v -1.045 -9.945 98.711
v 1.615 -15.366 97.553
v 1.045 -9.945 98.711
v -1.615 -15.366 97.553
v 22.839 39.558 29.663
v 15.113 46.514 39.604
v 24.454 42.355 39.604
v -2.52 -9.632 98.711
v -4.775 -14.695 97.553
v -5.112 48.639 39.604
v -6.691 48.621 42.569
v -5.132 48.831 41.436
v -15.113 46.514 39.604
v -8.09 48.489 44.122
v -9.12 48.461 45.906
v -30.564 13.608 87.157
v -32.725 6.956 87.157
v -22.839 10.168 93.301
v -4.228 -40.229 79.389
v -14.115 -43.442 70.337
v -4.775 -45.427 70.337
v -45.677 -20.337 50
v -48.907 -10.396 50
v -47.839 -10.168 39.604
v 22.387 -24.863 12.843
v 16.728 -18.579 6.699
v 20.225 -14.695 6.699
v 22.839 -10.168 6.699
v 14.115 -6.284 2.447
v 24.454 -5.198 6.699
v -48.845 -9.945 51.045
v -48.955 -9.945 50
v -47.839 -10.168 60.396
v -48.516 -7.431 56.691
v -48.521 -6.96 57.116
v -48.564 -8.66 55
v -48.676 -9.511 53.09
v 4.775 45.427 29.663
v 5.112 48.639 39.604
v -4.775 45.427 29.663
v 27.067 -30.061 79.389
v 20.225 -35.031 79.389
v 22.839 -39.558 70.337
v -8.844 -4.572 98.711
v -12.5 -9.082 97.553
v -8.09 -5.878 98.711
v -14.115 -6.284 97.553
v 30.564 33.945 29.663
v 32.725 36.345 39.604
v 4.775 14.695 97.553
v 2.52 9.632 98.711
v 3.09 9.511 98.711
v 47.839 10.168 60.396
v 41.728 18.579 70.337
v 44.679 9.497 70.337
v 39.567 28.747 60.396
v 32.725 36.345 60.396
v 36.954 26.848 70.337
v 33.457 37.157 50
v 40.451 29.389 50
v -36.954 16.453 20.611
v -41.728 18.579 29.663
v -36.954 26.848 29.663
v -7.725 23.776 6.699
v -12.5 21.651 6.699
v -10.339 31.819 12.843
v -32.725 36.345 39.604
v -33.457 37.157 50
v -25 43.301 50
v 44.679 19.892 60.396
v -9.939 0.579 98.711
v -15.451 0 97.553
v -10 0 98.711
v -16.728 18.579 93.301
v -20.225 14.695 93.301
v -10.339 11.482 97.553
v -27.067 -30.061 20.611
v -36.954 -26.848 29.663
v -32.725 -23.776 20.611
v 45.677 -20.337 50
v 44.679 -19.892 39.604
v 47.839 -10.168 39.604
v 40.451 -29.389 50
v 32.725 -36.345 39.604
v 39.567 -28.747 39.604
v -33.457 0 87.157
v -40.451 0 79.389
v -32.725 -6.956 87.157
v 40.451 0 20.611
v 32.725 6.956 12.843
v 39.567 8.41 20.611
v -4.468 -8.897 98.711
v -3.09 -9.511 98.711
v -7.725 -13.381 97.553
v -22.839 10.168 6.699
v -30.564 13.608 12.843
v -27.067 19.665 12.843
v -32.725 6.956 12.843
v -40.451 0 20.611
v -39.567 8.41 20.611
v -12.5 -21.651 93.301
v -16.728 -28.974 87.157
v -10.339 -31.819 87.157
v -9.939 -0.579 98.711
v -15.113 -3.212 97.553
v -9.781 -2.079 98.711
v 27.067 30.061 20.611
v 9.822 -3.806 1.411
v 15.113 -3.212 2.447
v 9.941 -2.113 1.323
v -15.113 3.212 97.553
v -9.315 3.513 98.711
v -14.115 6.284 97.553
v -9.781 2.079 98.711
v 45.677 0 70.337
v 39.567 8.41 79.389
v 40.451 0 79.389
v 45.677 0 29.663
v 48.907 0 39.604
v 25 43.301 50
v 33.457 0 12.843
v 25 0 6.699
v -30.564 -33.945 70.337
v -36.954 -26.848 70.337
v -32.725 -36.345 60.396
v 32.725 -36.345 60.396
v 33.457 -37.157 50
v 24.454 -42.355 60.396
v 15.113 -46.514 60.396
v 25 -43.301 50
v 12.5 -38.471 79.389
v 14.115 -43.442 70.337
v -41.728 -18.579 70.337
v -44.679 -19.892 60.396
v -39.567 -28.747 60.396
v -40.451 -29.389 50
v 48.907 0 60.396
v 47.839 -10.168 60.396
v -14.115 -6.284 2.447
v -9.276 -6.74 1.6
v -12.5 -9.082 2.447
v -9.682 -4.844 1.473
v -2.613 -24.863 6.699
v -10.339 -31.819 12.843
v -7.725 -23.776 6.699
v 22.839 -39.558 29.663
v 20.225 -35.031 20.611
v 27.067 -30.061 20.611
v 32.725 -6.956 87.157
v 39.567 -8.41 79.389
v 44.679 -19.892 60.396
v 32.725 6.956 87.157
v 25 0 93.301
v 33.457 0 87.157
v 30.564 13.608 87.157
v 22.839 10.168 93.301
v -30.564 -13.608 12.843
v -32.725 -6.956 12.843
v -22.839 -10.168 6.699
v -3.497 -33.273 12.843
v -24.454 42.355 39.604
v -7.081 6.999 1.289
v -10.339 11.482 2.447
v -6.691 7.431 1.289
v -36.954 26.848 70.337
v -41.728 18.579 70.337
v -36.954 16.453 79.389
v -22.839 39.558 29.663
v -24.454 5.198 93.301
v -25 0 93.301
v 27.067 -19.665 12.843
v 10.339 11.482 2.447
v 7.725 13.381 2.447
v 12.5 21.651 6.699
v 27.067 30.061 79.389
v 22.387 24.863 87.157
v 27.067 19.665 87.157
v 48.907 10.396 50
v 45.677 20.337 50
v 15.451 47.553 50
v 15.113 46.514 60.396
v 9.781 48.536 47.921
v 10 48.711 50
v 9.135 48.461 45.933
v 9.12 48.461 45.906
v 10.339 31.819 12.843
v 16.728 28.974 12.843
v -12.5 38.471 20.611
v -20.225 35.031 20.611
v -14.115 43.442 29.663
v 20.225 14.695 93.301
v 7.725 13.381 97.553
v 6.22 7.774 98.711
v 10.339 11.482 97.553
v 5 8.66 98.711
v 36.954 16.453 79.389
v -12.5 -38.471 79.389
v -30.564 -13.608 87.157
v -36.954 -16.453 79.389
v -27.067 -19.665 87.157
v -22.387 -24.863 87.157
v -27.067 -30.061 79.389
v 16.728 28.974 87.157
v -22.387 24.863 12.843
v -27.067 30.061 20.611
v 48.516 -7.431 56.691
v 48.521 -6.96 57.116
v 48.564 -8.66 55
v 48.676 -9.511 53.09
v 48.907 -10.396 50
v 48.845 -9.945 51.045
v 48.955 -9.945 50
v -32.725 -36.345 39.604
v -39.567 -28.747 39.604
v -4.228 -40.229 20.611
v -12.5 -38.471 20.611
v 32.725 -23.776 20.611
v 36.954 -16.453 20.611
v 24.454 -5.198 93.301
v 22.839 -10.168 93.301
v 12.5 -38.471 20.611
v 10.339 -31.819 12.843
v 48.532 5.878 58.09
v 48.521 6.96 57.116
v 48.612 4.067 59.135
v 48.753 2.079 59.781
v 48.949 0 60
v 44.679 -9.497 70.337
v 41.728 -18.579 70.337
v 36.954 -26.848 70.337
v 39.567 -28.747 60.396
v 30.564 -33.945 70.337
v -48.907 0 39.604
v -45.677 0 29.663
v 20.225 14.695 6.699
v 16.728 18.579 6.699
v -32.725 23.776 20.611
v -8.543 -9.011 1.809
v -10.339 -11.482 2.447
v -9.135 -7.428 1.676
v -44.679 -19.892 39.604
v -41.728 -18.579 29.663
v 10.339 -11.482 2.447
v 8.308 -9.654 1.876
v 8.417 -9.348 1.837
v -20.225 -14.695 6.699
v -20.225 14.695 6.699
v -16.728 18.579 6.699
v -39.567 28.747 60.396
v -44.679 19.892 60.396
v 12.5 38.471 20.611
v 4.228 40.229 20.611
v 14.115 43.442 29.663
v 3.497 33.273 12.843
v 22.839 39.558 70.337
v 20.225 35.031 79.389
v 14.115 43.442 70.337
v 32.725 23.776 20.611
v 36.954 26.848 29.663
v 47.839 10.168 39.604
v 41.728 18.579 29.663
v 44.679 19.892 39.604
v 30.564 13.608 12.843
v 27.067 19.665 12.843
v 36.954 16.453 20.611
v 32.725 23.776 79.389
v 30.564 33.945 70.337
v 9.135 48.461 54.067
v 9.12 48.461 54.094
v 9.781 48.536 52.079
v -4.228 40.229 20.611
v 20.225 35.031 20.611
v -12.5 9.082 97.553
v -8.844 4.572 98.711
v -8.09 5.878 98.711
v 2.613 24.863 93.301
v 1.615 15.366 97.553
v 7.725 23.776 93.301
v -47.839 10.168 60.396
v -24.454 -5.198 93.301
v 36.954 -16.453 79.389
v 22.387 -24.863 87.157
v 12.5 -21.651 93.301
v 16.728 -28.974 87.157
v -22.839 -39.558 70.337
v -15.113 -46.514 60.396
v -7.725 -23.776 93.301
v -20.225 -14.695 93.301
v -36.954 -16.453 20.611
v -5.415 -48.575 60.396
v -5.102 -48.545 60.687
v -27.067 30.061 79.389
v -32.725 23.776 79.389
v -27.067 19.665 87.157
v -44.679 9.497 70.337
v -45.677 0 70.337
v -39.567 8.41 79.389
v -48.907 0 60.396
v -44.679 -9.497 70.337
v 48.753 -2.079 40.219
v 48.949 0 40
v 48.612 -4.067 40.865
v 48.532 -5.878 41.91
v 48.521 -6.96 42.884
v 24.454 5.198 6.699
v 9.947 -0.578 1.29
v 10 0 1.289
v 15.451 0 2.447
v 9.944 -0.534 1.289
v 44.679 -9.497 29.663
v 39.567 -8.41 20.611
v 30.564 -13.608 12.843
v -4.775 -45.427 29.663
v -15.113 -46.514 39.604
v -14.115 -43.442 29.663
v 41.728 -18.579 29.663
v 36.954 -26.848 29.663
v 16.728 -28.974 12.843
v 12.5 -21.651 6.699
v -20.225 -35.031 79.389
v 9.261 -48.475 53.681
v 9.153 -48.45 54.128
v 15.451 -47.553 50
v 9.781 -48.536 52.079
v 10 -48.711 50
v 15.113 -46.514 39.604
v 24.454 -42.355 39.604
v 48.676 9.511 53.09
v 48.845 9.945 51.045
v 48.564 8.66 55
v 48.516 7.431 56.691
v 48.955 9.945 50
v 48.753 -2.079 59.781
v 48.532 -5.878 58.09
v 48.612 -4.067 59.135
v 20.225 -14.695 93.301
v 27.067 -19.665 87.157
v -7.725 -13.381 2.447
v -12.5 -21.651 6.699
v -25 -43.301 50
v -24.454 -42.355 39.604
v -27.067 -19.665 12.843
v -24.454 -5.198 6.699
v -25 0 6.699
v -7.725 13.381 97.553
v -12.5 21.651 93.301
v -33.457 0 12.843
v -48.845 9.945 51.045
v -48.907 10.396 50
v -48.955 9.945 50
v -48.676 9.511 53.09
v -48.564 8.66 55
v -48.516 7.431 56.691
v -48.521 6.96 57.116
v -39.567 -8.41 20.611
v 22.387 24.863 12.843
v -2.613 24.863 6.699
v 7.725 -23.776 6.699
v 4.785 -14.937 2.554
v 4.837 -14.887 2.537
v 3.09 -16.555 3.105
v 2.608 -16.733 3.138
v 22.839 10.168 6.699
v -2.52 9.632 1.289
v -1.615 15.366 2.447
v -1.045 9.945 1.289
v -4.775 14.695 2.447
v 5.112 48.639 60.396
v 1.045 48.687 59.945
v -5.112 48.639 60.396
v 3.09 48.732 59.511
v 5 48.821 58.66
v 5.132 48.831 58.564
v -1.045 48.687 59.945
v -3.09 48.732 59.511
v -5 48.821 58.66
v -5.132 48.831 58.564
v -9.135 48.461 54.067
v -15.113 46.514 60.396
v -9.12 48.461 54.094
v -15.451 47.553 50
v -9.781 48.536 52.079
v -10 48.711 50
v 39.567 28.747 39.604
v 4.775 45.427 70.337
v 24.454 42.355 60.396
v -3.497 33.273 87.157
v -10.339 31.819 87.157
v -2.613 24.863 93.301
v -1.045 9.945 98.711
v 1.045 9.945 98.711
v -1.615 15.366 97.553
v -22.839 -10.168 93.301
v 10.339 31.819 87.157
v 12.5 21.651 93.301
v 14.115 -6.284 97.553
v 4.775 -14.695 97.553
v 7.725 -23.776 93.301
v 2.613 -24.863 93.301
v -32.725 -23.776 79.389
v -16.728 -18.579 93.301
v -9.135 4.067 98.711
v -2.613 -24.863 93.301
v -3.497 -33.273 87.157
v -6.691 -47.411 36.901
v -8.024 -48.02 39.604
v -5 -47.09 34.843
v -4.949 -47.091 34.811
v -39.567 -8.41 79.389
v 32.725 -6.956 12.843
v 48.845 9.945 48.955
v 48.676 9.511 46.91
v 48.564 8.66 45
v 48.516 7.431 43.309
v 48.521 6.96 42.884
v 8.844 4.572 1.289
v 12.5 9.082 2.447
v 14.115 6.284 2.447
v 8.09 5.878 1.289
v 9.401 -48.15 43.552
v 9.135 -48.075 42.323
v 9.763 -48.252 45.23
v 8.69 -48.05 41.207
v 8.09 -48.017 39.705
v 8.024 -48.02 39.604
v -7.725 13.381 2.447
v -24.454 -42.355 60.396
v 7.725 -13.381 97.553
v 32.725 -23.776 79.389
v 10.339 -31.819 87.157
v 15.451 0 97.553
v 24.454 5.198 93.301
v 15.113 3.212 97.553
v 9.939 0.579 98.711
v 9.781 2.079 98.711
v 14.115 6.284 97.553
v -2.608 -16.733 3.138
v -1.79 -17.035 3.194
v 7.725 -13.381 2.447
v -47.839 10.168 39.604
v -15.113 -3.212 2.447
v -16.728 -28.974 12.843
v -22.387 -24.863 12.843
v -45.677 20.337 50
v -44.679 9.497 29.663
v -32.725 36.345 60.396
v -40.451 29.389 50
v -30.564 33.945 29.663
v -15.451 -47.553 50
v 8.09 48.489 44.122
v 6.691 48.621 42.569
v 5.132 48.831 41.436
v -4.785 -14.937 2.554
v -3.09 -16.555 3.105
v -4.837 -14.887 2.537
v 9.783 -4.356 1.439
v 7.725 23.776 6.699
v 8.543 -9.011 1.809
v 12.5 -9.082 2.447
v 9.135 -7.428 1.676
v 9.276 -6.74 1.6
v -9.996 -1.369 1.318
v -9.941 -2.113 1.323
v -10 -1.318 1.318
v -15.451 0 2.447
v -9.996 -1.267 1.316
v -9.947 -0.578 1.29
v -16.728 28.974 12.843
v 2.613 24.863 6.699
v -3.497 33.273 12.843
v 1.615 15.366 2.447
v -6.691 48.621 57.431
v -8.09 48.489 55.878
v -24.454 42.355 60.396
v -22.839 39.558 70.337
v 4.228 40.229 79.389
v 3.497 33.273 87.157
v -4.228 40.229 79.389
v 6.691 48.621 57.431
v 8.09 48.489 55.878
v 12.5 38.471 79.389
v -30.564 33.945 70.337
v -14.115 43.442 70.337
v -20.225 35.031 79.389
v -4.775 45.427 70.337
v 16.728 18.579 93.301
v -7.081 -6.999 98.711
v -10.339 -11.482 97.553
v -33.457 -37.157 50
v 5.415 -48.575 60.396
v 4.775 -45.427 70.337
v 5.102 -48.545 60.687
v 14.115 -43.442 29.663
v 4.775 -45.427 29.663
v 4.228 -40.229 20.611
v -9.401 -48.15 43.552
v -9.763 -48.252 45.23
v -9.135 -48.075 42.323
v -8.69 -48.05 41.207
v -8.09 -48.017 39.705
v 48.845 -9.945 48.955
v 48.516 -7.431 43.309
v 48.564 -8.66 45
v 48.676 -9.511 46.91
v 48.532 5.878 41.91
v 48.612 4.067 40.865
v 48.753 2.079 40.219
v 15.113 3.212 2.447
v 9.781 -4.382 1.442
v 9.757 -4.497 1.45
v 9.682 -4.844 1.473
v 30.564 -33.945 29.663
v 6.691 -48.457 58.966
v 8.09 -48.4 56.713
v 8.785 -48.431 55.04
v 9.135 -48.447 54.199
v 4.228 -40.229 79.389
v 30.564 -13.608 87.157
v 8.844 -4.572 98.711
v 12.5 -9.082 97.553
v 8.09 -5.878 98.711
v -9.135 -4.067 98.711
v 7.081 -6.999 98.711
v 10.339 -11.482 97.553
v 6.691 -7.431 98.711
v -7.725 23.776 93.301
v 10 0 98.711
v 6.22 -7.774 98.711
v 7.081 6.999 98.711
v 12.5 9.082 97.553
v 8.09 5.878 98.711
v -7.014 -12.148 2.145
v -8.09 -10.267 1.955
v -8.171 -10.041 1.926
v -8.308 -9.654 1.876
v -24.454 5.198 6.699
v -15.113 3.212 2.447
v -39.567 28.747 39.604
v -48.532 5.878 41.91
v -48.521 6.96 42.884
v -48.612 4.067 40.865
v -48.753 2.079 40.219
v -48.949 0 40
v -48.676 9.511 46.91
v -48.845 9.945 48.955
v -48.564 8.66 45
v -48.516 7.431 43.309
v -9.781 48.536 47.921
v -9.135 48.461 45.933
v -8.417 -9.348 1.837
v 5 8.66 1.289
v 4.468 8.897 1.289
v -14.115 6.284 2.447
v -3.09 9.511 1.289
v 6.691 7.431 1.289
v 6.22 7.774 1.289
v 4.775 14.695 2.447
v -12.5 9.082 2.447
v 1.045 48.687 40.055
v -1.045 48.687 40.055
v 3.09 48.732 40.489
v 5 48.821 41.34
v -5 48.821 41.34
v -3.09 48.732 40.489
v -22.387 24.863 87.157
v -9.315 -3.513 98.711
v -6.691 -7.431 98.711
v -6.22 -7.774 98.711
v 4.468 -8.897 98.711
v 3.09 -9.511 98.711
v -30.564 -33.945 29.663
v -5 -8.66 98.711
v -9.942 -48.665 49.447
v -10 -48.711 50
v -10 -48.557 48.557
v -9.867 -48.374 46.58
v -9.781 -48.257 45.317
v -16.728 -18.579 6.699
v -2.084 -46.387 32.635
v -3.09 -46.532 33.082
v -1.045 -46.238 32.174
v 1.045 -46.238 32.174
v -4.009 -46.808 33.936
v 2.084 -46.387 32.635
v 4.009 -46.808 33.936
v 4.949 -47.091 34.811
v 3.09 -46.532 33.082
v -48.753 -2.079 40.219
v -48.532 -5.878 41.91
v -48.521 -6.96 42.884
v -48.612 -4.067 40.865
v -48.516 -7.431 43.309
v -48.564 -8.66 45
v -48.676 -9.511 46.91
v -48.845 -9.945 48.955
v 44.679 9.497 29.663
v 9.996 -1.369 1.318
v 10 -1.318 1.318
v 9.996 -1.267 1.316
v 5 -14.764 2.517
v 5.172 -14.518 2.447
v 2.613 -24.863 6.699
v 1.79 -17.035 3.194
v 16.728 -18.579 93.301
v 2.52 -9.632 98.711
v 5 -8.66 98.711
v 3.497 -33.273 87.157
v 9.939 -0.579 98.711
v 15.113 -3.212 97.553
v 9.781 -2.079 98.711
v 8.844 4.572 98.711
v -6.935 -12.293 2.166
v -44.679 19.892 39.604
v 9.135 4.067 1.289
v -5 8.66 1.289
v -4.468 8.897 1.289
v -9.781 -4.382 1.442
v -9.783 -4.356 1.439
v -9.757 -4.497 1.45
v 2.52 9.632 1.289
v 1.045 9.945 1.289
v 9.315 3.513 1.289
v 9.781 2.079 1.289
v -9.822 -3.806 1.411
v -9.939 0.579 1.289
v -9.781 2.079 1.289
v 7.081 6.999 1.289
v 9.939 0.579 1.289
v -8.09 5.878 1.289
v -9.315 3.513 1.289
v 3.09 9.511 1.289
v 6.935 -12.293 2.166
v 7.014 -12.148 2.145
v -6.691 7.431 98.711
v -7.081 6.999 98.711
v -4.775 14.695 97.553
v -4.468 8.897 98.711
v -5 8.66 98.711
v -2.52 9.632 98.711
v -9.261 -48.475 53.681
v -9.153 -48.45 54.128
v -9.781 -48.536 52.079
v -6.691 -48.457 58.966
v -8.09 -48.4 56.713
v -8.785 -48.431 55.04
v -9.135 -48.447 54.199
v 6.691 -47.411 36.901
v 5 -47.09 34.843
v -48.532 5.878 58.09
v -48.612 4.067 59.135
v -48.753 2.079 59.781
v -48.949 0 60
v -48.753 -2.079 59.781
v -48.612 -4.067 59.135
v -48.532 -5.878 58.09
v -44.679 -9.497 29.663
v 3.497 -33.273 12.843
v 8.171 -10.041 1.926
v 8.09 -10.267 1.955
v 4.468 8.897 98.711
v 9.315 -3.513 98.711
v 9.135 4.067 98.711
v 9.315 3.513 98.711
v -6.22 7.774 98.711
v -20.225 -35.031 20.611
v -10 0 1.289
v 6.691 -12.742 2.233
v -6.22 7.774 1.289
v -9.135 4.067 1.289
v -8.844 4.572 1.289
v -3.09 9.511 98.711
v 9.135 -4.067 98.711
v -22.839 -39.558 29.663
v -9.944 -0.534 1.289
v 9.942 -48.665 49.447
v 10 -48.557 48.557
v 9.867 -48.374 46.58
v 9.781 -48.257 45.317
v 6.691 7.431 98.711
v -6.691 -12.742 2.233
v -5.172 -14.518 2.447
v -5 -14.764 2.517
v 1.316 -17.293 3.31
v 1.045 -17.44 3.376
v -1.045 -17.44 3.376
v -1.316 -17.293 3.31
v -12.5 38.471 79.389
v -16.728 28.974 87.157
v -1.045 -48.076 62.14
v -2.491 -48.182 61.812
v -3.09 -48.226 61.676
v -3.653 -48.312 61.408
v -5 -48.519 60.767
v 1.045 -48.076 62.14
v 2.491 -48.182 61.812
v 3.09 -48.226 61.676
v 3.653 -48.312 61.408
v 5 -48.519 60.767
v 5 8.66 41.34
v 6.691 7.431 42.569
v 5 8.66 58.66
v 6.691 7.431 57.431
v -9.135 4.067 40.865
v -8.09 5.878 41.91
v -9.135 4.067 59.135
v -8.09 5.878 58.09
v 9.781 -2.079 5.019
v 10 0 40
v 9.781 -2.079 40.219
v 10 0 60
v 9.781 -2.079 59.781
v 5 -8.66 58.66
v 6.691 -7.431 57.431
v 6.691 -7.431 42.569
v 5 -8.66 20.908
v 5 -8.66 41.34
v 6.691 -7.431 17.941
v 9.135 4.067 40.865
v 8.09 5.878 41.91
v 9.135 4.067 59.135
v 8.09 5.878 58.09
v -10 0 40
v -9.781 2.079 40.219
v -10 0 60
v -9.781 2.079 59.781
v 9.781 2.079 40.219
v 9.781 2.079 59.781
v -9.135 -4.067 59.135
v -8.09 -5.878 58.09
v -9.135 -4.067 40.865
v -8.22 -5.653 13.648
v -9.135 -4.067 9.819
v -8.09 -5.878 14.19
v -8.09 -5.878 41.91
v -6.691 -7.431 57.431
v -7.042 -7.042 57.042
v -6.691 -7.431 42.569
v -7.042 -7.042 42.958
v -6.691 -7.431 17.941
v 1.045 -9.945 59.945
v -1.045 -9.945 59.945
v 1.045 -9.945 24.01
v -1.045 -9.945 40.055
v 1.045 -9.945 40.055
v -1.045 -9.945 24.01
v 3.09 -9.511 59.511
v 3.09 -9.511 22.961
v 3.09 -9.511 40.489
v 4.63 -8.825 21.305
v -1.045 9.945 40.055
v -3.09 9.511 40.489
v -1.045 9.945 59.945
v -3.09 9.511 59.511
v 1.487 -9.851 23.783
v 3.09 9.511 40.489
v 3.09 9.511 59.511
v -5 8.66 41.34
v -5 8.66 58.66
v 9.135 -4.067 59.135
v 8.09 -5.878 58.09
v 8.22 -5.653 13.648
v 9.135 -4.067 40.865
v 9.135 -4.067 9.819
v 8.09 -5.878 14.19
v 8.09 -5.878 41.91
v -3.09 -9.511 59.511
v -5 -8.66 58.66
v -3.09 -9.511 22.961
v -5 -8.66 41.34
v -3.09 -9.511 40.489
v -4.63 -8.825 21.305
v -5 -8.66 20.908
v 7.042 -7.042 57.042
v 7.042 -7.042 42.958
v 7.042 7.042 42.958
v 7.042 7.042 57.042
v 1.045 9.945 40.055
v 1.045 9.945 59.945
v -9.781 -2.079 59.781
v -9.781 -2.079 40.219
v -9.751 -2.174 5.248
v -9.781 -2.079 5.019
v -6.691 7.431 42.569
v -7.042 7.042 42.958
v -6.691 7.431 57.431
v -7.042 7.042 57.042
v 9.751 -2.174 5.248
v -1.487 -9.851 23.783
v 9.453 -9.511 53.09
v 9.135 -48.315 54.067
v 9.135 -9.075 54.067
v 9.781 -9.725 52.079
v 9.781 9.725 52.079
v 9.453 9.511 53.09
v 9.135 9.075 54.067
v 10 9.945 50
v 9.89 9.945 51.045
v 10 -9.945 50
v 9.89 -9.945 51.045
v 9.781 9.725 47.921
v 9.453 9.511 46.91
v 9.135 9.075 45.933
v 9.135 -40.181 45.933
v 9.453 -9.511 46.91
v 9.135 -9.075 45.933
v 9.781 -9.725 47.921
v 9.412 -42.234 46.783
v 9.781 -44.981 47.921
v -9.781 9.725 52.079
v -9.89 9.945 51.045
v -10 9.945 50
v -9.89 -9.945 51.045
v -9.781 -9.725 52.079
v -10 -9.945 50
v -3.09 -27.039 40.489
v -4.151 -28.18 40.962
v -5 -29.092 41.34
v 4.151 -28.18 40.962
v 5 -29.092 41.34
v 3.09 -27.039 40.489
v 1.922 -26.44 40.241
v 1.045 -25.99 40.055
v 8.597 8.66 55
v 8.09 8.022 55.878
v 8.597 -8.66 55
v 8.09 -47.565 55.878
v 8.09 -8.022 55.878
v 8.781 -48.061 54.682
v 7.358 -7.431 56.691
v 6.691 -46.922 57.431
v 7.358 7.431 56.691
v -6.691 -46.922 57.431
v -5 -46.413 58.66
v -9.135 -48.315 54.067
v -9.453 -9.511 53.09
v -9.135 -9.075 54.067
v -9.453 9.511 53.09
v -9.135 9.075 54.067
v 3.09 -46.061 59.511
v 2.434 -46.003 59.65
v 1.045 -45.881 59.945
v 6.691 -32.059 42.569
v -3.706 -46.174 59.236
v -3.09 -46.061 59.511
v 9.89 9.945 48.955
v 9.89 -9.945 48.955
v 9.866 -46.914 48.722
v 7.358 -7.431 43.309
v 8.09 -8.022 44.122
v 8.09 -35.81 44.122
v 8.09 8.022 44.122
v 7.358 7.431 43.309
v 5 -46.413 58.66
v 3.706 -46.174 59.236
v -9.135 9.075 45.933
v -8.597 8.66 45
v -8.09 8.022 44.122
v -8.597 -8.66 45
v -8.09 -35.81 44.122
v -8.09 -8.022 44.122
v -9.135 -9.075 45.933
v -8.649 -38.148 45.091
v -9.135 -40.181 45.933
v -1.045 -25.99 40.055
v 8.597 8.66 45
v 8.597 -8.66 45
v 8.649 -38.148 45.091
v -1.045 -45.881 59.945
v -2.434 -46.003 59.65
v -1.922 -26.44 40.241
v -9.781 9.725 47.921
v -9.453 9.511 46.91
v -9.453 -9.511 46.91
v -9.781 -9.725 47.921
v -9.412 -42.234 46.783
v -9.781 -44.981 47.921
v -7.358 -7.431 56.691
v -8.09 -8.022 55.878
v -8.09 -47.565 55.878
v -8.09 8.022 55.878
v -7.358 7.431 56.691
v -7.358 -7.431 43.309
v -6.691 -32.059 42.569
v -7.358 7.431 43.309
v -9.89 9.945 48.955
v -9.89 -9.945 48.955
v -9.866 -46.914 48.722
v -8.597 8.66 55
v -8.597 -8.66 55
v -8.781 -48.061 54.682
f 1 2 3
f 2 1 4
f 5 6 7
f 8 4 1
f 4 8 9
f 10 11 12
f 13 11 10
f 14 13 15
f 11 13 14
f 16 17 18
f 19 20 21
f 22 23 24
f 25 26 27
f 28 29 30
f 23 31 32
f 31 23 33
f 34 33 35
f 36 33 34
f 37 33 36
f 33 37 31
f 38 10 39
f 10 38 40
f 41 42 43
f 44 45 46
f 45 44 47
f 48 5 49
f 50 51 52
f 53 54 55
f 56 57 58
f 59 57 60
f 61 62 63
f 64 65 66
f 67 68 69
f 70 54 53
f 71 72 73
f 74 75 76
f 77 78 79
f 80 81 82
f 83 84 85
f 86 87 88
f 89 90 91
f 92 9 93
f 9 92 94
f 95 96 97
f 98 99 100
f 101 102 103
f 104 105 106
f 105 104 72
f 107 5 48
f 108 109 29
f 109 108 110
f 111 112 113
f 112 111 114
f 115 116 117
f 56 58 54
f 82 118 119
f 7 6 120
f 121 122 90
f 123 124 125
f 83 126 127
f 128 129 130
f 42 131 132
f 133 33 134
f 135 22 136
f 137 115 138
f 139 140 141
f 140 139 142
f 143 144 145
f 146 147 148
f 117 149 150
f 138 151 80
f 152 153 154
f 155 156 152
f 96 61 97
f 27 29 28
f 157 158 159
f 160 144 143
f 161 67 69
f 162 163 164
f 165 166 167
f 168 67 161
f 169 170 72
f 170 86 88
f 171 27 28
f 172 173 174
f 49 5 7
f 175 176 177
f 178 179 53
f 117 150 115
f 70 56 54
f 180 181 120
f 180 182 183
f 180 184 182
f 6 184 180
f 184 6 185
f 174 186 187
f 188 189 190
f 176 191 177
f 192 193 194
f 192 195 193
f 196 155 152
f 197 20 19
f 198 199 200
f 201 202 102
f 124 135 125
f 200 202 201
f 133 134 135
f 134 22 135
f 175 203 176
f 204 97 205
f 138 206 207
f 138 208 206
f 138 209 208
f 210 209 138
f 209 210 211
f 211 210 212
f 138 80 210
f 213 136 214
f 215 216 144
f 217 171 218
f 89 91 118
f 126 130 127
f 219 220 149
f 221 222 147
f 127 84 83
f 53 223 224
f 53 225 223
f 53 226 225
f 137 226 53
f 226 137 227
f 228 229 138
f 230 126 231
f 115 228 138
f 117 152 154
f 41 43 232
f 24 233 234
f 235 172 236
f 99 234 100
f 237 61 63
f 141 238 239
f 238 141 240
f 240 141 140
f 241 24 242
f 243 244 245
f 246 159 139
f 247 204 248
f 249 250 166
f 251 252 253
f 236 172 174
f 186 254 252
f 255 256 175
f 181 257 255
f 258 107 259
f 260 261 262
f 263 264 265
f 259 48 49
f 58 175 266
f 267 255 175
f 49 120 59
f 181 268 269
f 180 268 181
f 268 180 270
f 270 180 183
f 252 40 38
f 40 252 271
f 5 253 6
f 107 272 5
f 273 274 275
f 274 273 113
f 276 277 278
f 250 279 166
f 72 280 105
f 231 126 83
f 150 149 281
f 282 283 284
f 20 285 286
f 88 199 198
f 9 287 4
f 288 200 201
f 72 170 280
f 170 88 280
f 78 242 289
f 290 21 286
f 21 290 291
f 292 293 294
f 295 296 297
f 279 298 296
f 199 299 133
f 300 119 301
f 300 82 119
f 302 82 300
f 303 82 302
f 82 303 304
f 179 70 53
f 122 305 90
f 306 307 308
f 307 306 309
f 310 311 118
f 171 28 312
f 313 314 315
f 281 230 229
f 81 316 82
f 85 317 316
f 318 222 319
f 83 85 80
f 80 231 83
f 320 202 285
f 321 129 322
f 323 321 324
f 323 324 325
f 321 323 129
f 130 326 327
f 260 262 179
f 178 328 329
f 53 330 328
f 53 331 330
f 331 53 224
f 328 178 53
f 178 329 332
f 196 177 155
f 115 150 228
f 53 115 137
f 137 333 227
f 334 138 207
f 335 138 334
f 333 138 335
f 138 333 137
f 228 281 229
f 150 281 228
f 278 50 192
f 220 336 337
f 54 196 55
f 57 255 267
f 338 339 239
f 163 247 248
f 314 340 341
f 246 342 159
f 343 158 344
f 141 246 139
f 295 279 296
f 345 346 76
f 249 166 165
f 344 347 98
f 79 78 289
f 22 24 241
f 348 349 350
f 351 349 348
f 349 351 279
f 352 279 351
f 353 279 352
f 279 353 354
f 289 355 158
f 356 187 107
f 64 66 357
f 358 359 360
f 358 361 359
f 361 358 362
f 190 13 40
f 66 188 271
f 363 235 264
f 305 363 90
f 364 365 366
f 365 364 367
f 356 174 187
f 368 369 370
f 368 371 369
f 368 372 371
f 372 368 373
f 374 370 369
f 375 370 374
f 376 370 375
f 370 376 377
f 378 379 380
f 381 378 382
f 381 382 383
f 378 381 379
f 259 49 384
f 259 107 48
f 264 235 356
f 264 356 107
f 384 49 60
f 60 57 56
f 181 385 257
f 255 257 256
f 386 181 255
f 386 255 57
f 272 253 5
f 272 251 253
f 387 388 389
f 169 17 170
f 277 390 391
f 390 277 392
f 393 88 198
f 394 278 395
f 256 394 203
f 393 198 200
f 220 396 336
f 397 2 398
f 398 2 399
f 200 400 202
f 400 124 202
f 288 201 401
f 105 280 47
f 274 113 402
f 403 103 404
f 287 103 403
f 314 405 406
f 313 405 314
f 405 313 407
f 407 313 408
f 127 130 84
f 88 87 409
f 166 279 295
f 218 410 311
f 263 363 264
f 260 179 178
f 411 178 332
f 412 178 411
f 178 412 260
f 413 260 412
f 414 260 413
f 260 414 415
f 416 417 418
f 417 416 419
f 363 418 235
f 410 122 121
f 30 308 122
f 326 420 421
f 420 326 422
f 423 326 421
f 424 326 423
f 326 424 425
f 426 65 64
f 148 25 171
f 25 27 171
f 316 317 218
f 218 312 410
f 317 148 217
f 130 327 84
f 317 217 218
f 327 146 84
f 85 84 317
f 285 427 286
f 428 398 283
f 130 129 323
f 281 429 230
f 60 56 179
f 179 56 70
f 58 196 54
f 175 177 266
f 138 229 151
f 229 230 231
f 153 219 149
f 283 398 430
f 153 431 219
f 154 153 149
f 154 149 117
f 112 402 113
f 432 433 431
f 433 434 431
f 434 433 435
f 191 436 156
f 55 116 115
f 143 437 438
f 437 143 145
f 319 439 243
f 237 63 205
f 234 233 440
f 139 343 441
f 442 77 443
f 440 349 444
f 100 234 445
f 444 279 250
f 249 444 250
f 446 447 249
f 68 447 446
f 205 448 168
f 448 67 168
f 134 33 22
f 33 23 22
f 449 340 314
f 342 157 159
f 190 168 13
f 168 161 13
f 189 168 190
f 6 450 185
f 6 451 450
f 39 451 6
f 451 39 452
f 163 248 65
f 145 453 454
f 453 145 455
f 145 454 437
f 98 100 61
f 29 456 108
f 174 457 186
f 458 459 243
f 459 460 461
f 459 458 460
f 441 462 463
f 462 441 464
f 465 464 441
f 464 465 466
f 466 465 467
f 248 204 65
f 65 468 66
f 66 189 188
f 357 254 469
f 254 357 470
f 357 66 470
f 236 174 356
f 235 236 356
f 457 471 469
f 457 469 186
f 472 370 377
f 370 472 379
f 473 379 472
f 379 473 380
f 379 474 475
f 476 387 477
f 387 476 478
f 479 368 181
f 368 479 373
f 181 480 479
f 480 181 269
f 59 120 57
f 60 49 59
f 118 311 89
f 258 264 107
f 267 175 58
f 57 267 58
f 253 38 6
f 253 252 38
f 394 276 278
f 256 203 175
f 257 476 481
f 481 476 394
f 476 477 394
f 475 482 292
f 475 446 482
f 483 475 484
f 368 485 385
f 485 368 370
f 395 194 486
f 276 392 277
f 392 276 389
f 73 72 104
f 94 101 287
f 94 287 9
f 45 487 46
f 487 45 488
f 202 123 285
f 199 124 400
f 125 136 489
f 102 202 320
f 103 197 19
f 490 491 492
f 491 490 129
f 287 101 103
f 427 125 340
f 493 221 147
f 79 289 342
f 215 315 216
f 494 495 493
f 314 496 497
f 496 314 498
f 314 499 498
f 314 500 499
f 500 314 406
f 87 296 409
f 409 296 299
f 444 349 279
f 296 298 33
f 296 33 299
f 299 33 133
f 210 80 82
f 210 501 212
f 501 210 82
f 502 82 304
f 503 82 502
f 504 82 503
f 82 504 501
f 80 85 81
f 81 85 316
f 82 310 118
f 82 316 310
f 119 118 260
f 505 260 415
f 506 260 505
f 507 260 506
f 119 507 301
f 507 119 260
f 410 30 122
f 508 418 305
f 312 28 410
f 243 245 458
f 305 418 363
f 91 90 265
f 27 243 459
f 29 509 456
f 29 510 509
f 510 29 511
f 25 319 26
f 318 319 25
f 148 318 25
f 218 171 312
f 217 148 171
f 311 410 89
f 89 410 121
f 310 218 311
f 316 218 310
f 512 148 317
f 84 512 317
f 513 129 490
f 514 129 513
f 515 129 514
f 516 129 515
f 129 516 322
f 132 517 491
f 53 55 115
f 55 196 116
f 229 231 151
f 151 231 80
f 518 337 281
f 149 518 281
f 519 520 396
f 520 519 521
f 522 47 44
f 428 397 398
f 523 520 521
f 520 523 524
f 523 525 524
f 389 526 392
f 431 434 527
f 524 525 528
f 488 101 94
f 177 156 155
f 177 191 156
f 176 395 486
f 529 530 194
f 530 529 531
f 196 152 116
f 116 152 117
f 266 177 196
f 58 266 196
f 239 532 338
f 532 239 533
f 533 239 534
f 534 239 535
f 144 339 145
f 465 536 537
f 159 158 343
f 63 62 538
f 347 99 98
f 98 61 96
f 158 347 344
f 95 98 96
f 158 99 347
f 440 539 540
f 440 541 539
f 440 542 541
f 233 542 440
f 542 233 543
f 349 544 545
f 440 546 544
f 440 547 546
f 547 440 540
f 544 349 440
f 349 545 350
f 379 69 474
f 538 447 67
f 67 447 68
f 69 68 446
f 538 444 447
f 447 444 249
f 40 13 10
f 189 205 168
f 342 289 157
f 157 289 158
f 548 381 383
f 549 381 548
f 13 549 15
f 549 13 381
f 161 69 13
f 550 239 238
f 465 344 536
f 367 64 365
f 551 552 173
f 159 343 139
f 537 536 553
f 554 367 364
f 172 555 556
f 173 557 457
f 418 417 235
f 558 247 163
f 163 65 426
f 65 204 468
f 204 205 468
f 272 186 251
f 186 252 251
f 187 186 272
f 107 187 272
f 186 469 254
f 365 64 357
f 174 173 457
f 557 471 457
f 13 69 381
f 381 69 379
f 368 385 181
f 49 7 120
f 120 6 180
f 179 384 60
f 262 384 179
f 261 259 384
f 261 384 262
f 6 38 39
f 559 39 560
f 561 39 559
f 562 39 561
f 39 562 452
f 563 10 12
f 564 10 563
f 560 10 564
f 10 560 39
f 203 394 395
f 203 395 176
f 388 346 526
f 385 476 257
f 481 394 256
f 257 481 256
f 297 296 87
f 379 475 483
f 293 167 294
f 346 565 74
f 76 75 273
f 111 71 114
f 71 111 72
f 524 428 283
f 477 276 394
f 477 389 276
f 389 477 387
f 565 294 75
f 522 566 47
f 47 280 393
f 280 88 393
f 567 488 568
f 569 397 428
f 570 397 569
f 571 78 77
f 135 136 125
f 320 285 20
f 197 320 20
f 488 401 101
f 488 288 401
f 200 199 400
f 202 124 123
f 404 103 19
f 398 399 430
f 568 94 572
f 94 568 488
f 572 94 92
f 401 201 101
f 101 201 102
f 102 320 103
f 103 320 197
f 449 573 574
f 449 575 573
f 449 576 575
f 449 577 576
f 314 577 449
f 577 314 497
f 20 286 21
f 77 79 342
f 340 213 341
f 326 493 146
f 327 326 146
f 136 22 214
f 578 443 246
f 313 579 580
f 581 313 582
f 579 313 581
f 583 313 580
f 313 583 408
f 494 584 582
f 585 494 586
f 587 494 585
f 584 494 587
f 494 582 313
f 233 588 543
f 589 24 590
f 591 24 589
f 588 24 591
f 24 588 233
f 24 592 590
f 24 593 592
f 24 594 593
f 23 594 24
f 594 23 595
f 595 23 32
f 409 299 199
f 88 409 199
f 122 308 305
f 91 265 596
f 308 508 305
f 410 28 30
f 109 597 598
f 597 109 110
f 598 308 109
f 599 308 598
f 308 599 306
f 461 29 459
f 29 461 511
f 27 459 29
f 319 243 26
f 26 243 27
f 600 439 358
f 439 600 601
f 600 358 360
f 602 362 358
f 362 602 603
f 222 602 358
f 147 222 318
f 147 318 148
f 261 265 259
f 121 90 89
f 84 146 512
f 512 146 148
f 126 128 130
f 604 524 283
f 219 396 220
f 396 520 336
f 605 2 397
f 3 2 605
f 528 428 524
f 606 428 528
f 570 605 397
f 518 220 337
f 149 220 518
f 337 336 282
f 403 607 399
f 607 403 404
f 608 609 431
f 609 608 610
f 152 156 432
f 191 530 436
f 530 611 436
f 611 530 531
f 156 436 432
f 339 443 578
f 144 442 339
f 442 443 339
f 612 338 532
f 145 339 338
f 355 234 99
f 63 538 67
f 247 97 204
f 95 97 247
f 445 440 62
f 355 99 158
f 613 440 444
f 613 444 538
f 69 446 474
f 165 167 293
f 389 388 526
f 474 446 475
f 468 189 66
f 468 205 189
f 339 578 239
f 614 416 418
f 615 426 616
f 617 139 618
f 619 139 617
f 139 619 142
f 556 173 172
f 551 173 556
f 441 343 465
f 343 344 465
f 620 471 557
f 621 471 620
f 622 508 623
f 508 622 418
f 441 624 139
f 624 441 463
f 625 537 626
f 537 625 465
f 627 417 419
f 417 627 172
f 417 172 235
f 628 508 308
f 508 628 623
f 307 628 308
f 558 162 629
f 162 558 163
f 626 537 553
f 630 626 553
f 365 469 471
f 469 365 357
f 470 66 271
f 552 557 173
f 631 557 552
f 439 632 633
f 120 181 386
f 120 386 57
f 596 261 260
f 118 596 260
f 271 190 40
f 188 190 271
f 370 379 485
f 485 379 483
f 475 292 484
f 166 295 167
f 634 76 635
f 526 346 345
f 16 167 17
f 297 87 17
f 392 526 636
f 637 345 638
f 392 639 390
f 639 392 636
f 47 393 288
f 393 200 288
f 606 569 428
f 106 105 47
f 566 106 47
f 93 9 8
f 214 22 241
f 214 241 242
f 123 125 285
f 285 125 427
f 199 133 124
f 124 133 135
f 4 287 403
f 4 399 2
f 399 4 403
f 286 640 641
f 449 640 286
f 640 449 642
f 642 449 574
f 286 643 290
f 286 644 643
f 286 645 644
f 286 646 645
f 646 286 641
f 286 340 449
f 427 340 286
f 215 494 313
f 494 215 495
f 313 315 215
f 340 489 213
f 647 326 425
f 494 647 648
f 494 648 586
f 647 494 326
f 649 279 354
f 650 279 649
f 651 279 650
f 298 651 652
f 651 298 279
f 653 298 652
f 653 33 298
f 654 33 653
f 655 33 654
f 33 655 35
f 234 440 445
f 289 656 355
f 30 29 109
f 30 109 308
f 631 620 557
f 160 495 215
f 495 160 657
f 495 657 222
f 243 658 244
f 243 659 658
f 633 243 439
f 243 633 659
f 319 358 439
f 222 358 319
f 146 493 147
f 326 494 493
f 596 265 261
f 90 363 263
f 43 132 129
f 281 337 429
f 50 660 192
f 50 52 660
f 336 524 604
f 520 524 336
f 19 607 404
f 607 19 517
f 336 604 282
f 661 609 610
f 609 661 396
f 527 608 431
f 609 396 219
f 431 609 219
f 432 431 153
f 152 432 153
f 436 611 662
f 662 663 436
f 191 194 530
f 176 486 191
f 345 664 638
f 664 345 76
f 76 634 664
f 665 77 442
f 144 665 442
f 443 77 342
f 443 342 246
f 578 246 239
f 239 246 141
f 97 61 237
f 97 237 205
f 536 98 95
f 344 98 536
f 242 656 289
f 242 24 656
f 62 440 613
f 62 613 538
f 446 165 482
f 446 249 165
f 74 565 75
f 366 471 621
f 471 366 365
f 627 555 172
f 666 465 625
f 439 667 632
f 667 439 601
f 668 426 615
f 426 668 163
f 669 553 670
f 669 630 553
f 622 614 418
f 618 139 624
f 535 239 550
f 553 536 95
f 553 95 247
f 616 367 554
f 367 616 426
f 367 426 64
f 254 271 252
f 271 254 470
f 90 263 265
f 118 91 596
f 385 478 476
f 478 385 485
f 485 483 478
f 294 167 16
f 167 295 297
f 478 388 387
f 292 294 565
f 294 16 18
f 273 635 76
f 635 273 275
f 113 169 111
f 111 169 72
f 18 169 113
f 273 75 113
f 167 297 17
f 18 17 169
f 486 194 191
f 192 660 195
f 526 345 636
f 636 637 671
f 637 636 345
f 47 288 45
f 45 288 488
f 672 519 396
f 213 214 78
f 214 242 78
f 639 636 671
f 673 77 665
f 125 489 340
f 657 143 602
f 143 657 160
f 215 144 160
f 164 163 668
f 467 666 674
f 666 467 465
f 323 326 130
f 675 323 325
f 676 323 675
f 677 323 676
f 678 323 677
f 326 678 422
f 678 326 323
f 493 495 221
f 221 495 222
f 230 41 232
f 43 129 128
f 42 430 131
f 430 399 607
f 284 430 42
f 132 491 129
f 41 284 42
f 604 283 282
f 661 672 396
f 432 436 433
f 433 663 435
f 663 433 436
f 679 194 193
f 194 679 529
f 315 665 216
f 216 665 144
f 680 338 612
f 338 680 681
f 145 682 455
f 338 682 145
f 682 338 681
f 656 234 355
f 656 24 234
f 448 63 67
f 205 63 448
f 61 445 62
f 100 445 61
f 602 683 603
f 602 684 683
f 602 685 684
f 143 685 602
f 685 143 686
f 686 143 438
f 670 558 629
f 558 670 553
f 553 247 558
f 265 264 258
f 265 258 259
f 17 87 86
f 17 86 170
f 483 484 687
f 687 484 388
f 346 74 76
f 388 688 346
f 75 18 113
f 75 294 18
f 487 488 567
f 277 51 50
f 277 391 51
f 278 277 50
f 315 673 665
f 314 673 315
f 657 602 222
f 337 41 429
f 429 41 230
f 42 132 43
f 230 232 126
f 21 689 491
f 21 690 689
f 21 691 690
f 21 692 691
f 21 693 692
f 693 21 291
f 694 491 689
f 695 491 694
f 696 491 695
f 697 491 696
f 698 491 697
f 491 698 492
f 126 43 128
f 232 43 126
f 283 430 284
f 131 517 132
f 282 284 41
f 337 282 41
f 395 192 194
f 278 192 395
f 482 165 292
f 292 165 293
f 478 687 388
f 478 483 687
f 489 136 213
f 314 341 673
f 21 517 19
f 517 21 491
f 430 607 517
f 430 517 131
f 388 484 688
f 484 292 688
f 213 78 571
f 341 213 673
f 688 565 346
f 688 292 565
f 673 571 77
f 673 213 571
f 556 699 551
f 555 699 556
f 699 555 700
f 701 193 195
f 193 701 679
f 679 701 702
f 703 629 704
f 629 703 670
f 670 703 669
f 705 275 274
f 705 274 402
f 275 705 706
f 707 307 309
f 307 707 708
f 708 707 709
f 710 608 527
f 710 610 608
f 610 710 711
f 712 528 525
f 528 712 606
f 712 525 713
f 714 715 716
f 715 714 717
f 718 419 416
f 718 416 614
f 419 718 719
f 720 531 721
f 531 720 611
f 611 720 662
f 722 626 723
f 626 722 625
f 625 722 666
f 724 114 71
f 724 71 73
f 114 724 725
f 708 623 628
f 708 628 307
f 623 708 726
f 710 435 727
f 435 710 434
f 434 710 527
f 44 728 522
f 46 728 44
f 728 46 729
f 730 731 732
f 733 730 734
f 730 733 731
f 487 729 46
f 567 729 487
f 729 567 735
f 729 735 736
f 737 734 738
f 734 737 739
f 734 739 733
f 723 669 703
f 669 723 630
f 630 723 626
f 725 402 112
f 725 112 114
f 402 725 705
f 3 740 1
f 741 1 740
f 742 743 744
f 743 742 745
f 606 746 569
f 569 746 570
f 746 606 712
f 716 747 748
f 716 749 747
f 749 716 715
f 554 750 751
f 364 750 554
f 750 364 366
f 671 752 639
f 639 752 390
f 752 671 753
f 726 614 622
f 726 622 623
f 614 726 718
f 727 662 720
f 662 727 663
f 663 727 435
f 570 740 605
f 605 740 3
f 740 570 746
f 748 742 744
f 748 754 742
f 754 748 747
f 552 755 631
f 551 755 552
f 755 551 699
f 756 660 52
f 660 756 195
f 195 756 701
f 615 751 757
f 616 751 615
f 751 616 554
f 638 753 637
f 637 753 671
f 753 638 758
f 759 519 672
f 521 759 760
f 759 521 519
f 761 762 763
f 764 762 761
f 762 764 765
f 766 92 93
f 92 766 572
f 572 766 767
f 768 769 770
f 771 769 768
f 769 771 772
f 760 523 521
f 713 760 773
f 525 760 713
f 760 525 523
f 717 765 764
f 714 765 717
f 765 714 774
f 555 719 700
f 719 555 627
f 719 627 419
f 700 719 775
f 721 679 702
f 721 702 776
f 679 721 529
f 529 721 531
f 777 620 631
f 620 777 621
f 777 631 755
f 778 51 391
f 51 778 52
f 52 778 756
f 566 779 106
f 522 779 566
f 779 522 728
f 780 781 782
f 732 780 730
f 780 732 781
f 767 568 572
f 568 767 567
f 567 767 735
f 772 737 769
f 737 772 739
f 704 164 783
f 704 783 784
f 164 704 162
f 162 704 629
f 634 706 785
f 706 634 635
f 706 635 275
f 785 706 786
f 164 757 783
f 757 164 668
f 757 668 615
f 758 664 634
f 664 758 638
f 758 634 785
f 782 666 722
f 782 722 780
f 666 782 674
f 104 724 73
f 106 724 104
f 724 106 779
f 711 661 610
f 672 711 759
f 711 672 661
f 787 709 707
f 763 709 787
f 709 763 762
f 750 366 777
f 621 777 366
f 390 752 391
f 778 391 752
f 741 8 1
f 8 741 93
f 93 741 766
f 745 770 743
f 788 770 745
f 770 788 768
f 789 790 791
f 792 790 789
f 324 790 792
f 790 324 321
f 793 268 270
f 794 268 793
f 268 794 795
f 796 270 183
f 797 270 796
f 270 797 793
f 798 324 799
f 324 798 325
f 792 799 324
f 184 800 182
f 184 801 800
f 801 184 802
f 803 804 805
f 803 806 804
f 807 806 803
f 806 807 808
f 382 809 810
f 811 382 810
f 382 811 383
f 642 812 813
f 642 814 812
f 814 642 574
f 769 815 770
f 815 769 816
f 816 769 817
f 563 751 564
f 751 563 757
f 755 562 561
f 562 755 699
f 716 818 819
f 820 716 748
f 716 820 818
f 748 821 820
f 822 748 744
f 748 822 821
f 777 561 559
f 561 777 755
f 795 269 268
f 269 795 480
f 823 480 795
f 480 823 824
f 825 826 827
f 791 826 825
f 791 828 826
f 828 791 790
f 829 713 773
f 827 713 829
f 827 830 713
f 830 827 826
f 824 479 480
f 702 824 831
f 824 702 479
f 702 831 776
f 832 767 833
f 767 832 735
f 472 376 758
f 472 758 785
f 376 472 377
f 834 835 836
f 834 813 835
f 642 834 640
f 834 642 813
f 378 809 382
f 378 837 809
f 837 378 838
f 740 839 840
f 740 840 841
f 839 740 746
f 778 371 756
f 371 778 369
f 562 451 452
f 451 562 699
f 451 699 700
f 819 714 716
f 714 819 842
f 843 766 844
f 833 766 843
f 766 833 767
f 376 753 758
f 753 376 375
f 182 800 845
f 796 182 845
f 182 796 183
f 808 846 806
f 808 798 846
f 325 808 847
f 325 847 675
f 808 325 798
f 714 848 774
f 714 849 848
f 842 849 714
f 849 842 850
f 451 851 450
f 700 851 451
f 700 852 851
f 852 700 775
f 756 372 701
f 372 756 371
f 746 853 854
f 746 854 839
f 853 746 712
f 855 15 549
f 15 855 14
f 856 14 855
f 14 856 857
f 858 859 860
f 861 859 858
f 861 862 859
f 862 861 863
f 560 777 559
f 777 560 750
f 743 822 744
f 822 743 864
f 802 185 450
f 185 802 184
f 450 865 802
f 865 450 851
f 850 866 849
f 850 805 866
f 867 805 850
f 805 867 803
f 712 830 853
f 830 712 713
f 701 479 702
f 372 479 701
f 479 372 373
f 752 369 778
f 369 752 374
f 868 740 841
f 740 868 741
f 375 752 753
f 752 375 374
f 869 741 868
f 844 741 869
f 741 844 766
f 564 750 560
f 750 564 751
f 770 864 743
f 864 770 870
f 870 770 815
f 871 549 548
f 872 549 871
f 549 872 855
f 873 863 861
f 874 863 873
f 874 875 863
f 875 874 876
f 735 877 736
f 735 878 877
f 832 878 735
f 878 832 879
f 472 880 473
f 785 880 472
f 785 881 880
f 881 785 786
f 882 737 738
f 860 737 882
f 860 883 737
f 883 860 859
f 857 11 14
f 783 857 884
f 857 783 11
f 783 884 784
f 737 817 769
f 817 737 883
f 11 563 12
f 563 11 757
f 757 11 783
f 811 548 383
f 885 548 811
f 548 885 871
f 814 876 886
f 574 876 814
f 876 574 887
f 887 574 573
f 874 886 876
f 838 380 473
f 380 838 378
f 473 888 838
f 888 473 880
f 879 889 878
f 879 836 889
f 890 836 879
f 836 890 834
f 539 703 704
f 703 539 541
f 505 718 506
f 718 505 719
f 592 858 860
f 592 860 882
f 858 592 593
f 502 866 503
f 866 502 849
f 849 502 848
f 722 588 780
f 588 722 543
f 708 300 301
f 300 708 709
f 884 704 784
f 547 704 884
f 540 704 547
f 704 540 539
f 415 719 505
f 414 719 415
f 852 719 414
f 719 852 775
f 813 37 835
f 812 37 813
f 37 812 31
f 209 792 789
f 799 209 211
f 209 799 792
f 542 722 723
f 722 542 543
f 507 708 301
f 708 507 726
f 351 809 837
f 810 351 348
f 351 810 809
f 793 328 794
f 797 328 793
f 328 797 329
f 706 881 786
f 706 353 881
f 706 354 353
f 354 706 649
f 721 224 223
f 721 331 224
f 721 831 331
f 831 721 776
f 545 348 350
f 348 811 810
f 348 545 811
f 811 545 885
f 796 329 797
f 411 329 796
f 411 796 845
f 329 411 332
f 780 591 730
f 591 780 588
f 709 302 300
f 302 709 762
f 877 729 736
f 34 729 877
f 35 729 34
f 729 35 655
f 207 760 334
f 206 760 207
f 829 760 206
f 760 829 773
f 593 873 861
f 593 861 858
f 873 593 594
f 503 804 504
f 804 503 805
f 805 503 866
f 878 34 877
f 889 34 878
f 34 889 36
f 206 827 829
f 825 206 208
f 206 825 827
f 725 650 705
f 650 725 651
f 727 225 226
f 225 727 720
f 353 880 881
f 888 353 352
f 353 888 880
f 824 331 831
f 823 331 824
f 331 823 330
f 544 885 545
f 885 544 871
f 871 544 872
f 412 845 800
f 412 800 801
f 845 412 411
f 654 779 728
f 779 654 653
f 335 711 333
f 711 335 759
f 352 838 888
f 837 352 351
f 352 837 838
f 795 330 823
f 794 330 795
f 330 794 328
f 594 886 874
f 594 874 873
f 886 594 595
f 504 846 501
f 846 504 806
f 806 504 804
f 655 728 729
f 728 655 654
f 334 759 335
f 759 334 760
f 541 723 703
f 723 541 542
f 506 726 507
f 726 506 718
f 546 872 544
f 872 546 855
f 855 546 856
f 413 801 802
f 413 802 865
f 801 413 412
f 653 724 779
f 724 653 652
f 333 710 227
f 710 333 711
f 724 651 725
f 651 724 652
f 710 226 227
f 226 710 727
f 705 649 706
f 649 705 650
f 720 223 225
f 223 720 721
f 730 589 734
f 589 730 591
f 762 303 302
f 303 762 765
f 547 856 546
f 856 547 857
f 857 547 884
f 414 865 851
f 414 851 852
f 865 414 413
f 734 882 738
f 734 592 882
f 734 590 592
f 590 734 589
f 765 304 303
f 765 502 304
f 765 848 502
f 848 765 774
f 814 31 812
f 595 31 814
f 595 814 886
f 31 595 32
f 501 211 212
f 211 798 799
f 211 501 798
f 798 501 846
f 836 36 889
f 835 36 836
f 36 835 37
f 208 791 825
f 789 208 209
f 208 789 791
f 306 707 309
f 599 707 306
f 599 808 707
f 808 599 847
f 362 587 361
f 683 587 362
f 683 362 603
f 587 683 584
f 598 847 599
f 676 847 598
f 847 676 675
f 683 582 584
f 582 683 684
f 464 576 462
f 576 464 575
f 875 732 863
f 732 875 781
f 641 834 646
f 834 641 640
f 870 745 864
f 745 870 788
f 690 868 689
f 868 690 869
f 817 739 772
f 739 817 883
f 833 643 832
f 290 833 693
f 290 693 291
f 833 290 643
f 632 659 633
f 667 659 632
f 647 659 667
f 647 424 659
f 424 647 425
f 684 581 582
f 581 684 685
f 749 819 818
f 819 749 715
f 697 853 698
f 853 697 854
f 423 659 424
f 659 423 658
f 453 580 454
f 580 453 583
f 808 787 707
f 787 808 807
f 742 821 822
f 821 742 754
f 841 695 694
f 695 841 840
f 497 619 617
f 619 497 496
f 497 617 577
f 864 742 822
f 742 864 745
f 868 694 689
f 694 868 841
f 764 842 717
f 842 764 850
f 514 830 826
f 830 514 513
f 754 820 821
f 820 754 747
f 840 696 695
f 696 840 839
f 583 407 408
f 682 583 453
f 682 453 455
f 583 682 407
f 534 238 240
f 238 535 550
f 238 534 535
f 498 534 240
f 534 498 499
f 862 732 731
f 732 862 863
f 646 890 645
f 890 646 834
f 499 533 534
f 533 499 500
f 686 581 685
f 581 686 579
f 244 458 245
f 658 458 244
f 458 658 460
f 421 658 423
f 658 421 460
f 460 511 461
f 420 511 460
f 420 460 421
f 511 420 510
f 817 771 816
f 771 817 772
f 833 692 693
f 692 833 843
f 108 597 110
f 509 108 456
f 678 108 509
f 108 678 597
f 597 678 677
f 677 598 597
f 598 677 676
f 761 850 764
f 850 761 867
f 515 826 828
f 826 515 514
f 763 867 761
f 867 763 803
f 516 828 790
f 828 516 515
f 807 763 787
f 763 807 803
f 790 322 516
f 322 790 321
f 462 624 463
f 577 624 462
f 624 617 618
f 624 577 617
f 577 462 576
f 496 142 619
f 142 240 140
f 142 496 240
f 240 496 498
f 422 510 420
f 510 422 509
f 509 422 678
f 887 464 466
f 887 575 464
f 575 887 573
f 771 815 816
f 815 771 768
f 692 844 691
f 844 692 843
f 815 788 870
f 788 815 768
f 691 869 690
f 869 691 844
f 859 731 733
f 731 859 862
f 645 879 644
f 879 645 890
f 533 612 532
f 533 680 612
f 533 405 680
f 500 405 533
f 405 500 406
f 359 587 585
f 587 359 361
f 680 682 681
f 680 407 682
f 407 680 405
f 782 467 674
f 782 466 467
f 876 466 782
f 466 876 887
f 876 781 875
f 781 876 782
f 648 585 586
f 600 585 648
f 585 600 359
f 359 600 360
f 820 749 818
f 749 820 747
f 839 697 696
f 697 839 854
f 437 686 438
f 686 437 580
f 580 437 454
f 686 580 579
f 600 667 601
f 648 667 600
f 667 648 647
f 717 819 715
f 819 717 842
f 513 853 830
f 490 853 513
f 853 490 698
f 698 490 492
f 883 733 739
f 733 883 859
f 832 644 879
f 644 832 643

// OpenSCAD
difference()
{
	translate([0,0,50]) sphere(d = 100);
	translate([0,0,-1]) cylinder(h=110,d=20);
	translate([0,50,50]) rotate([90,0,0]) cylinder(h=110,d=20);
	translate([-50,0,50]) rotate([0,90,0]) cylinder(h=110,d=20);
	translate([0,0,0]) rotate([45,0,0]) cylinder(h=110,d=20);
}
